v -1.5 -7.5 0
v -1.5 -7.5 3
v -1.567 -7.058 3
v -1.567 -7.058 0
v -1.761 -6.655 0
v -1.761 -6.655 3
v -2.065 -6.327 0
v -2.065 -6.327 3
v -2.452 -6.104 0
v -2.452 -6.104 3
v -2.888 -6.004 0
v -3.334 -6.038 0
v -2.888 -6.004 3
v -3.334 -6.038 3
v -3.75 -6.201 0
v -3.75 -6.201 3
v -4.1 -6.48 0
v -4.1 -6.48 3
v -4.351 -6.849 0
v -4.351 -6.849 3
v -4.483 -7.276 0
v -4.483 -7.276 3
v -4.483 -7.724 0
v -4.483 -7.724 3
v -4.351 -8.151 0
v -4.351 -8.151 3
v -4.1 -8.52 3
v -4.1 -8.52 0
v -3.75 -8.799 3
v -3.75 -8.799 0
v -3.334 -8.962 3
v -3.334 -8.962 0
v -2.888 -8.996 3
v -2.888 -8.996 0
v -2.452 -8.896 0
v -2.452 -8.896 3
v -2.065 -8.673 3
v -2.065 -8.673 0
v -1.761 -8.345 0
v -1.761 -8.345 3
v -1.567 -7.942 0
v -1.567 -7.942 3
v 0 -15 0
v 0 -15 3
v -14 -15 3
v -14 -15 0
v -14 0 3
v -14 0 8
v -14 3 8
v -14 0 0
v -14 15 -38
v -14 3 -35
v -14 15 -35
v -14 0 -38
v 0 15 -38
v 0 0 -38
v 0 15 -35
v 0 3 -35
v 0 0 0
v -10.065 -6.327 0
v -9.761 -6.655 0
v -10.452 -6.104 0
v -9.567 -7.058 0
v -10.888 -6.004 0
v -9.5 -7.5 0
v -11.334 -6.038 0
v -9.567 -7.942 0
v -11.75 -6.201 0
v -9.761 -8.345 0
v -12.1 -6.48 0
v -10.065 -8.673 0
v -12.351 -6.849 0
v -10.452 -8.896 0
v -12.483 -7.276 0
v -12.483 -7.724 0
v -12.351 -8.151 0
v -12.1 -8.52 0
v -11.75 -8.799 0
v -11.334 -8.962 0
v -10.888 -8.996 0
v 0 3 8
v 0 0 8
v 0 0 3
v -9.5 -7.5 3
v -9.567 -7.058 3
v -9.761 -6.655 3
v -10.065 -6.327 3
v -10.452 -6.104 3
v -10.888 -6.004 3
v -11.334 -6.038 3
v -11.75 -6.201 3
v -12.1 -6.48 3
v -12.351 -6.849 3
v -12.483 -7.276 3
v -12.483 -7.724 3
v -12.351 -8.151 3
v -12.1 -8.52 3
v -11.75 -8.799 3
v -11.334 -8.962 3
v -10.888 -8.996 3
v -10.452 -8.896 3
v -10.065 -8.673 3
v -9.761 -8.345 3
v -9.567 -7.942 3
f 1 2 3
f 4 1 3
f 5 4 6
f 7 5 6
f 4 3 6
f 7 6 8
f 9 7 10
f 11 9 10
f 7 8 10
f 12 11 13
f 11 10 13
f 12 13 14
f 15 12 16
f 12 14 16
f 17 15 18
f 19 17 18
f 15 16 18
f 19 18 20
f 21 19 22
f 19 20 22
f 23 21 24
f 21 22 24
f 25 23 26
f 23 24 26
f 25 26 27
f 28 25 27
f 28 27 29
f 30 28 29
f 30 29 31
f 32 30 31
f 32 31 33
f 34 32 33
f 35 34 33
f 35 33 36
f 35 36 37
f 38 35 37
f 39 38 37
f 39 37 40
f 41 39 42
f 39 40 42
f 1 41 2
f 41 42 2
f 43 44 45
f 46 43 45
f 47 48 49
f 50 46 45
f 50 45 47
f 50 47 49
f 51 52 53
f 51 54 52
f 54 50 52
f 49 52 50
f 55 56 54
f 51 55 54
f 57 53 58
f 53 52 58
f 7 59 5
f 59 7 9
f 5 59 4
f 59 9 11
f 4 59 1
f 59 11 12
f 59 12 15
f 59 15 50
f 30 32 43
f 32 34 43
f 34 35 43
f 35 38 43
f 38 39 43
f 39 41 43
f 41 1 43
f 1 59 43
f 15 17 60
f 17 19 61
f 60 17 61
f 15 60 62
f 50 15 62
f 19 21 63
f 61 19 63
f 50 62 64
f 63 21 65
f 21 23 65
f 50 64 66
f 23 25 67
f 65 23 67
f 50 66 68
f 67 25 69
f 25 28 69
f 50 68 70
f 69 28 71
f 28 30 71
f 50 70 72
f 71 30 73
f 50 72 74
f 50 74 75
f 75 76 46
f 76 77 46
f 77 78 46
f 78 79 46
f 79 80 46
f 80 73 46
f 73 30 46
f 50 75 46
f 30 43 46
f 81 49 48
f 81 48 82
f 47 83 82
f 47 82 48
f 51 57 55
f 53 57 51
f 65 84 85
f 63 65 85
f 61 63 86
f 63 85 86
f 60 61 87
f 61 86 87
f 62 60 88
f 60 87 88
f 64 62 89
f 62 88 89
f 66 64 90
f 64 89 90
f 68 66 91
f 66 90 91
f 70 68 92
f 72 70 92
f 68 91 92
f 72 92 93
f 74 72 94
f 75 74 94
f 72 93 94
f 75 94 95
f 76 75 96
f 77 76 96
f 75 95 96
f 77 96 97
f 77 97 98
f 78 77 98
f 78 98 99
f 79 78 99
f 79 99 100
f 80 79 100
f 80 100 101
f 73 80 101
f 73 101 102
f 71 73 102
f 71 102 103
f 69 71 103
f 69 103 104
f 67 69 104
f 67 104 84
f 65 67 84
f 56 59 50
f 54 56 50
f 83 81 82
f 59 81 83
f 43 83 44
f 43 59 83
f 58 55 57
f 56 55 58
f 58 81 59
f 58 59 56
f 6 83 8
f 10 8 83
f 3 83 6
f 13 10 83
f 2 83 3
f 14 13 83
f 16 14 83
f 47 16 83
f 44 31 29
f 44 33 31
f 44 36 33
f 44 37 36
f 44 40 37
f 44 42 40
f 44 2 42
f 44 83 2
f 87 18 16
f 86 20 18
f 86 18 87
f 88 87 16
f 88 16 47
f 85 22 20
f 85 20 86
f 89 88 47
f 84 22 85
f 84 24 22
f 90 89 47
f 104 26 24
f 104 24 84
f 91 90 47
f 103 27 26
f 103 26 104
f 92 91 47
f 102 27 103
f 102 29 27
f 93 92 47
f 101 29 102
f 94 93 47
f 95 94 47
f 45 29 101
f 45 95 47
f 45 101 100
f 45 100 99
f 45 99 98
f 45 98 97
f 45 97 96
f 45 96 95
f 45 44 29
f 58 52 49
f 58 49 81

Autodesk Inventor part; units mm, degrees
ref_plane "YZ Plane" through (0, 0, 0) normal (1, 0, 0) x (0, 1, 0)
ref_plane "XZ Plane" through (0, 0, 0) normal (0, 1, 0) x (-1, 0, 0)
ref_plane "XY Plane" through (0, 0, 0) normal (0, 0, 1) x (1, 0, 0)
sketch "Sketch1" plane through (0, 0, 0) normal (0, 1, 0) x (-1, 0, 0)
  line L0 (0, 0) -> (14, 0)
  line L1 (14, 0) -> (14, -35)
  line L2 (14, -35) -> (0, -35)
  line L3 (0, -35) -> (0, 0)
  line L4 (14, -35) -> (0, -35)
  line L5 (0, -35) -> (0, -38)
  line L6 (0, -38) -> (14, -38)
  line L7 (14, -38) -> (14, -35)
  line L8 (14, 0) -> (0, 0)
  line L9 (0, 0) -> (0, 3)
  line L10 (0, 3) -> (14, 3)
  line L11 (14, 3) -> (14, 0)
  dimension "d0" = 14
  dimension "d1" = 35
  dimension "d2" = 3
  dimension "d3" = 3
extrude "Extrusion1" add sketch "Sketch1" along normal blind 3 contours L0 L1 L2 L3
extrude "Extrusion2" add sketch "Sketch1" along normal blind 15 contours L2 L7 L6 L5
extrude "Extrusion3" add sketch "Sketch1" along normal blind 3 and the other way blind 15 contours L9 L10 L11 L0
sketch "Sketch2" plane through (-14, 3, 3) normal (0, 0, 1) x (1, 0, 0)
  line L0 (0, 0) -> (14, 0) projected
  line L1 (14, 0) -> (14, -3)
  line L2 (14, -3) -> (0, -3)
  line L3 (0, -3) -> (0, 0)
  line L4 (0, 0) -> (14, 0)
extrude "Extrusion4" add sketch "Sketch2" along normal blind 5
sketch "Sketch3" plane through (-14, -15, 3) normal (0, 0, 1) x (1, 0, 0)
  line L0 (14, 0) -> (14, 15) projected
  line L1 (14, 15) -> (14, 11)
  line L2 (14, 0) -> (0, 0) projected
  line L3 (14, 0) -> (14, 4)
  line L4 (0, 0) -> (0, 15) projected
  line L5 (0, 0) -> (0, 4)
  line L6 (0, 15) -> (0, 11)
  line L7 (14, 7.5) -> (10, 7.5)
  line L8 (0, 7.5) -> (4, 7.5)
  line L9 (10, 7.5) -> (11, 7.5)
  circle A0 centre (11, 7.5) radius 1.5
  line L10 (4, 7.5) -> (1, 7.5)
  line L11 (4, 7.5) -> (3, 7.5)
  circle A1 centre (3, 7.5) radius 1.5
  dimension "d18" = 4
  dimension "d20" = 4
  dimension "d28" = 4
  dimension "d29" = 4
  dimension "d32" = 1
  dimension "d33" = 3
  dimension "d34" = 3
  dimension "d35" = 1
  dimension "d36" = 3
extrude "Extrusion5" cut sketch "Sketch3" against normal blind 5
properties part number "holder"
